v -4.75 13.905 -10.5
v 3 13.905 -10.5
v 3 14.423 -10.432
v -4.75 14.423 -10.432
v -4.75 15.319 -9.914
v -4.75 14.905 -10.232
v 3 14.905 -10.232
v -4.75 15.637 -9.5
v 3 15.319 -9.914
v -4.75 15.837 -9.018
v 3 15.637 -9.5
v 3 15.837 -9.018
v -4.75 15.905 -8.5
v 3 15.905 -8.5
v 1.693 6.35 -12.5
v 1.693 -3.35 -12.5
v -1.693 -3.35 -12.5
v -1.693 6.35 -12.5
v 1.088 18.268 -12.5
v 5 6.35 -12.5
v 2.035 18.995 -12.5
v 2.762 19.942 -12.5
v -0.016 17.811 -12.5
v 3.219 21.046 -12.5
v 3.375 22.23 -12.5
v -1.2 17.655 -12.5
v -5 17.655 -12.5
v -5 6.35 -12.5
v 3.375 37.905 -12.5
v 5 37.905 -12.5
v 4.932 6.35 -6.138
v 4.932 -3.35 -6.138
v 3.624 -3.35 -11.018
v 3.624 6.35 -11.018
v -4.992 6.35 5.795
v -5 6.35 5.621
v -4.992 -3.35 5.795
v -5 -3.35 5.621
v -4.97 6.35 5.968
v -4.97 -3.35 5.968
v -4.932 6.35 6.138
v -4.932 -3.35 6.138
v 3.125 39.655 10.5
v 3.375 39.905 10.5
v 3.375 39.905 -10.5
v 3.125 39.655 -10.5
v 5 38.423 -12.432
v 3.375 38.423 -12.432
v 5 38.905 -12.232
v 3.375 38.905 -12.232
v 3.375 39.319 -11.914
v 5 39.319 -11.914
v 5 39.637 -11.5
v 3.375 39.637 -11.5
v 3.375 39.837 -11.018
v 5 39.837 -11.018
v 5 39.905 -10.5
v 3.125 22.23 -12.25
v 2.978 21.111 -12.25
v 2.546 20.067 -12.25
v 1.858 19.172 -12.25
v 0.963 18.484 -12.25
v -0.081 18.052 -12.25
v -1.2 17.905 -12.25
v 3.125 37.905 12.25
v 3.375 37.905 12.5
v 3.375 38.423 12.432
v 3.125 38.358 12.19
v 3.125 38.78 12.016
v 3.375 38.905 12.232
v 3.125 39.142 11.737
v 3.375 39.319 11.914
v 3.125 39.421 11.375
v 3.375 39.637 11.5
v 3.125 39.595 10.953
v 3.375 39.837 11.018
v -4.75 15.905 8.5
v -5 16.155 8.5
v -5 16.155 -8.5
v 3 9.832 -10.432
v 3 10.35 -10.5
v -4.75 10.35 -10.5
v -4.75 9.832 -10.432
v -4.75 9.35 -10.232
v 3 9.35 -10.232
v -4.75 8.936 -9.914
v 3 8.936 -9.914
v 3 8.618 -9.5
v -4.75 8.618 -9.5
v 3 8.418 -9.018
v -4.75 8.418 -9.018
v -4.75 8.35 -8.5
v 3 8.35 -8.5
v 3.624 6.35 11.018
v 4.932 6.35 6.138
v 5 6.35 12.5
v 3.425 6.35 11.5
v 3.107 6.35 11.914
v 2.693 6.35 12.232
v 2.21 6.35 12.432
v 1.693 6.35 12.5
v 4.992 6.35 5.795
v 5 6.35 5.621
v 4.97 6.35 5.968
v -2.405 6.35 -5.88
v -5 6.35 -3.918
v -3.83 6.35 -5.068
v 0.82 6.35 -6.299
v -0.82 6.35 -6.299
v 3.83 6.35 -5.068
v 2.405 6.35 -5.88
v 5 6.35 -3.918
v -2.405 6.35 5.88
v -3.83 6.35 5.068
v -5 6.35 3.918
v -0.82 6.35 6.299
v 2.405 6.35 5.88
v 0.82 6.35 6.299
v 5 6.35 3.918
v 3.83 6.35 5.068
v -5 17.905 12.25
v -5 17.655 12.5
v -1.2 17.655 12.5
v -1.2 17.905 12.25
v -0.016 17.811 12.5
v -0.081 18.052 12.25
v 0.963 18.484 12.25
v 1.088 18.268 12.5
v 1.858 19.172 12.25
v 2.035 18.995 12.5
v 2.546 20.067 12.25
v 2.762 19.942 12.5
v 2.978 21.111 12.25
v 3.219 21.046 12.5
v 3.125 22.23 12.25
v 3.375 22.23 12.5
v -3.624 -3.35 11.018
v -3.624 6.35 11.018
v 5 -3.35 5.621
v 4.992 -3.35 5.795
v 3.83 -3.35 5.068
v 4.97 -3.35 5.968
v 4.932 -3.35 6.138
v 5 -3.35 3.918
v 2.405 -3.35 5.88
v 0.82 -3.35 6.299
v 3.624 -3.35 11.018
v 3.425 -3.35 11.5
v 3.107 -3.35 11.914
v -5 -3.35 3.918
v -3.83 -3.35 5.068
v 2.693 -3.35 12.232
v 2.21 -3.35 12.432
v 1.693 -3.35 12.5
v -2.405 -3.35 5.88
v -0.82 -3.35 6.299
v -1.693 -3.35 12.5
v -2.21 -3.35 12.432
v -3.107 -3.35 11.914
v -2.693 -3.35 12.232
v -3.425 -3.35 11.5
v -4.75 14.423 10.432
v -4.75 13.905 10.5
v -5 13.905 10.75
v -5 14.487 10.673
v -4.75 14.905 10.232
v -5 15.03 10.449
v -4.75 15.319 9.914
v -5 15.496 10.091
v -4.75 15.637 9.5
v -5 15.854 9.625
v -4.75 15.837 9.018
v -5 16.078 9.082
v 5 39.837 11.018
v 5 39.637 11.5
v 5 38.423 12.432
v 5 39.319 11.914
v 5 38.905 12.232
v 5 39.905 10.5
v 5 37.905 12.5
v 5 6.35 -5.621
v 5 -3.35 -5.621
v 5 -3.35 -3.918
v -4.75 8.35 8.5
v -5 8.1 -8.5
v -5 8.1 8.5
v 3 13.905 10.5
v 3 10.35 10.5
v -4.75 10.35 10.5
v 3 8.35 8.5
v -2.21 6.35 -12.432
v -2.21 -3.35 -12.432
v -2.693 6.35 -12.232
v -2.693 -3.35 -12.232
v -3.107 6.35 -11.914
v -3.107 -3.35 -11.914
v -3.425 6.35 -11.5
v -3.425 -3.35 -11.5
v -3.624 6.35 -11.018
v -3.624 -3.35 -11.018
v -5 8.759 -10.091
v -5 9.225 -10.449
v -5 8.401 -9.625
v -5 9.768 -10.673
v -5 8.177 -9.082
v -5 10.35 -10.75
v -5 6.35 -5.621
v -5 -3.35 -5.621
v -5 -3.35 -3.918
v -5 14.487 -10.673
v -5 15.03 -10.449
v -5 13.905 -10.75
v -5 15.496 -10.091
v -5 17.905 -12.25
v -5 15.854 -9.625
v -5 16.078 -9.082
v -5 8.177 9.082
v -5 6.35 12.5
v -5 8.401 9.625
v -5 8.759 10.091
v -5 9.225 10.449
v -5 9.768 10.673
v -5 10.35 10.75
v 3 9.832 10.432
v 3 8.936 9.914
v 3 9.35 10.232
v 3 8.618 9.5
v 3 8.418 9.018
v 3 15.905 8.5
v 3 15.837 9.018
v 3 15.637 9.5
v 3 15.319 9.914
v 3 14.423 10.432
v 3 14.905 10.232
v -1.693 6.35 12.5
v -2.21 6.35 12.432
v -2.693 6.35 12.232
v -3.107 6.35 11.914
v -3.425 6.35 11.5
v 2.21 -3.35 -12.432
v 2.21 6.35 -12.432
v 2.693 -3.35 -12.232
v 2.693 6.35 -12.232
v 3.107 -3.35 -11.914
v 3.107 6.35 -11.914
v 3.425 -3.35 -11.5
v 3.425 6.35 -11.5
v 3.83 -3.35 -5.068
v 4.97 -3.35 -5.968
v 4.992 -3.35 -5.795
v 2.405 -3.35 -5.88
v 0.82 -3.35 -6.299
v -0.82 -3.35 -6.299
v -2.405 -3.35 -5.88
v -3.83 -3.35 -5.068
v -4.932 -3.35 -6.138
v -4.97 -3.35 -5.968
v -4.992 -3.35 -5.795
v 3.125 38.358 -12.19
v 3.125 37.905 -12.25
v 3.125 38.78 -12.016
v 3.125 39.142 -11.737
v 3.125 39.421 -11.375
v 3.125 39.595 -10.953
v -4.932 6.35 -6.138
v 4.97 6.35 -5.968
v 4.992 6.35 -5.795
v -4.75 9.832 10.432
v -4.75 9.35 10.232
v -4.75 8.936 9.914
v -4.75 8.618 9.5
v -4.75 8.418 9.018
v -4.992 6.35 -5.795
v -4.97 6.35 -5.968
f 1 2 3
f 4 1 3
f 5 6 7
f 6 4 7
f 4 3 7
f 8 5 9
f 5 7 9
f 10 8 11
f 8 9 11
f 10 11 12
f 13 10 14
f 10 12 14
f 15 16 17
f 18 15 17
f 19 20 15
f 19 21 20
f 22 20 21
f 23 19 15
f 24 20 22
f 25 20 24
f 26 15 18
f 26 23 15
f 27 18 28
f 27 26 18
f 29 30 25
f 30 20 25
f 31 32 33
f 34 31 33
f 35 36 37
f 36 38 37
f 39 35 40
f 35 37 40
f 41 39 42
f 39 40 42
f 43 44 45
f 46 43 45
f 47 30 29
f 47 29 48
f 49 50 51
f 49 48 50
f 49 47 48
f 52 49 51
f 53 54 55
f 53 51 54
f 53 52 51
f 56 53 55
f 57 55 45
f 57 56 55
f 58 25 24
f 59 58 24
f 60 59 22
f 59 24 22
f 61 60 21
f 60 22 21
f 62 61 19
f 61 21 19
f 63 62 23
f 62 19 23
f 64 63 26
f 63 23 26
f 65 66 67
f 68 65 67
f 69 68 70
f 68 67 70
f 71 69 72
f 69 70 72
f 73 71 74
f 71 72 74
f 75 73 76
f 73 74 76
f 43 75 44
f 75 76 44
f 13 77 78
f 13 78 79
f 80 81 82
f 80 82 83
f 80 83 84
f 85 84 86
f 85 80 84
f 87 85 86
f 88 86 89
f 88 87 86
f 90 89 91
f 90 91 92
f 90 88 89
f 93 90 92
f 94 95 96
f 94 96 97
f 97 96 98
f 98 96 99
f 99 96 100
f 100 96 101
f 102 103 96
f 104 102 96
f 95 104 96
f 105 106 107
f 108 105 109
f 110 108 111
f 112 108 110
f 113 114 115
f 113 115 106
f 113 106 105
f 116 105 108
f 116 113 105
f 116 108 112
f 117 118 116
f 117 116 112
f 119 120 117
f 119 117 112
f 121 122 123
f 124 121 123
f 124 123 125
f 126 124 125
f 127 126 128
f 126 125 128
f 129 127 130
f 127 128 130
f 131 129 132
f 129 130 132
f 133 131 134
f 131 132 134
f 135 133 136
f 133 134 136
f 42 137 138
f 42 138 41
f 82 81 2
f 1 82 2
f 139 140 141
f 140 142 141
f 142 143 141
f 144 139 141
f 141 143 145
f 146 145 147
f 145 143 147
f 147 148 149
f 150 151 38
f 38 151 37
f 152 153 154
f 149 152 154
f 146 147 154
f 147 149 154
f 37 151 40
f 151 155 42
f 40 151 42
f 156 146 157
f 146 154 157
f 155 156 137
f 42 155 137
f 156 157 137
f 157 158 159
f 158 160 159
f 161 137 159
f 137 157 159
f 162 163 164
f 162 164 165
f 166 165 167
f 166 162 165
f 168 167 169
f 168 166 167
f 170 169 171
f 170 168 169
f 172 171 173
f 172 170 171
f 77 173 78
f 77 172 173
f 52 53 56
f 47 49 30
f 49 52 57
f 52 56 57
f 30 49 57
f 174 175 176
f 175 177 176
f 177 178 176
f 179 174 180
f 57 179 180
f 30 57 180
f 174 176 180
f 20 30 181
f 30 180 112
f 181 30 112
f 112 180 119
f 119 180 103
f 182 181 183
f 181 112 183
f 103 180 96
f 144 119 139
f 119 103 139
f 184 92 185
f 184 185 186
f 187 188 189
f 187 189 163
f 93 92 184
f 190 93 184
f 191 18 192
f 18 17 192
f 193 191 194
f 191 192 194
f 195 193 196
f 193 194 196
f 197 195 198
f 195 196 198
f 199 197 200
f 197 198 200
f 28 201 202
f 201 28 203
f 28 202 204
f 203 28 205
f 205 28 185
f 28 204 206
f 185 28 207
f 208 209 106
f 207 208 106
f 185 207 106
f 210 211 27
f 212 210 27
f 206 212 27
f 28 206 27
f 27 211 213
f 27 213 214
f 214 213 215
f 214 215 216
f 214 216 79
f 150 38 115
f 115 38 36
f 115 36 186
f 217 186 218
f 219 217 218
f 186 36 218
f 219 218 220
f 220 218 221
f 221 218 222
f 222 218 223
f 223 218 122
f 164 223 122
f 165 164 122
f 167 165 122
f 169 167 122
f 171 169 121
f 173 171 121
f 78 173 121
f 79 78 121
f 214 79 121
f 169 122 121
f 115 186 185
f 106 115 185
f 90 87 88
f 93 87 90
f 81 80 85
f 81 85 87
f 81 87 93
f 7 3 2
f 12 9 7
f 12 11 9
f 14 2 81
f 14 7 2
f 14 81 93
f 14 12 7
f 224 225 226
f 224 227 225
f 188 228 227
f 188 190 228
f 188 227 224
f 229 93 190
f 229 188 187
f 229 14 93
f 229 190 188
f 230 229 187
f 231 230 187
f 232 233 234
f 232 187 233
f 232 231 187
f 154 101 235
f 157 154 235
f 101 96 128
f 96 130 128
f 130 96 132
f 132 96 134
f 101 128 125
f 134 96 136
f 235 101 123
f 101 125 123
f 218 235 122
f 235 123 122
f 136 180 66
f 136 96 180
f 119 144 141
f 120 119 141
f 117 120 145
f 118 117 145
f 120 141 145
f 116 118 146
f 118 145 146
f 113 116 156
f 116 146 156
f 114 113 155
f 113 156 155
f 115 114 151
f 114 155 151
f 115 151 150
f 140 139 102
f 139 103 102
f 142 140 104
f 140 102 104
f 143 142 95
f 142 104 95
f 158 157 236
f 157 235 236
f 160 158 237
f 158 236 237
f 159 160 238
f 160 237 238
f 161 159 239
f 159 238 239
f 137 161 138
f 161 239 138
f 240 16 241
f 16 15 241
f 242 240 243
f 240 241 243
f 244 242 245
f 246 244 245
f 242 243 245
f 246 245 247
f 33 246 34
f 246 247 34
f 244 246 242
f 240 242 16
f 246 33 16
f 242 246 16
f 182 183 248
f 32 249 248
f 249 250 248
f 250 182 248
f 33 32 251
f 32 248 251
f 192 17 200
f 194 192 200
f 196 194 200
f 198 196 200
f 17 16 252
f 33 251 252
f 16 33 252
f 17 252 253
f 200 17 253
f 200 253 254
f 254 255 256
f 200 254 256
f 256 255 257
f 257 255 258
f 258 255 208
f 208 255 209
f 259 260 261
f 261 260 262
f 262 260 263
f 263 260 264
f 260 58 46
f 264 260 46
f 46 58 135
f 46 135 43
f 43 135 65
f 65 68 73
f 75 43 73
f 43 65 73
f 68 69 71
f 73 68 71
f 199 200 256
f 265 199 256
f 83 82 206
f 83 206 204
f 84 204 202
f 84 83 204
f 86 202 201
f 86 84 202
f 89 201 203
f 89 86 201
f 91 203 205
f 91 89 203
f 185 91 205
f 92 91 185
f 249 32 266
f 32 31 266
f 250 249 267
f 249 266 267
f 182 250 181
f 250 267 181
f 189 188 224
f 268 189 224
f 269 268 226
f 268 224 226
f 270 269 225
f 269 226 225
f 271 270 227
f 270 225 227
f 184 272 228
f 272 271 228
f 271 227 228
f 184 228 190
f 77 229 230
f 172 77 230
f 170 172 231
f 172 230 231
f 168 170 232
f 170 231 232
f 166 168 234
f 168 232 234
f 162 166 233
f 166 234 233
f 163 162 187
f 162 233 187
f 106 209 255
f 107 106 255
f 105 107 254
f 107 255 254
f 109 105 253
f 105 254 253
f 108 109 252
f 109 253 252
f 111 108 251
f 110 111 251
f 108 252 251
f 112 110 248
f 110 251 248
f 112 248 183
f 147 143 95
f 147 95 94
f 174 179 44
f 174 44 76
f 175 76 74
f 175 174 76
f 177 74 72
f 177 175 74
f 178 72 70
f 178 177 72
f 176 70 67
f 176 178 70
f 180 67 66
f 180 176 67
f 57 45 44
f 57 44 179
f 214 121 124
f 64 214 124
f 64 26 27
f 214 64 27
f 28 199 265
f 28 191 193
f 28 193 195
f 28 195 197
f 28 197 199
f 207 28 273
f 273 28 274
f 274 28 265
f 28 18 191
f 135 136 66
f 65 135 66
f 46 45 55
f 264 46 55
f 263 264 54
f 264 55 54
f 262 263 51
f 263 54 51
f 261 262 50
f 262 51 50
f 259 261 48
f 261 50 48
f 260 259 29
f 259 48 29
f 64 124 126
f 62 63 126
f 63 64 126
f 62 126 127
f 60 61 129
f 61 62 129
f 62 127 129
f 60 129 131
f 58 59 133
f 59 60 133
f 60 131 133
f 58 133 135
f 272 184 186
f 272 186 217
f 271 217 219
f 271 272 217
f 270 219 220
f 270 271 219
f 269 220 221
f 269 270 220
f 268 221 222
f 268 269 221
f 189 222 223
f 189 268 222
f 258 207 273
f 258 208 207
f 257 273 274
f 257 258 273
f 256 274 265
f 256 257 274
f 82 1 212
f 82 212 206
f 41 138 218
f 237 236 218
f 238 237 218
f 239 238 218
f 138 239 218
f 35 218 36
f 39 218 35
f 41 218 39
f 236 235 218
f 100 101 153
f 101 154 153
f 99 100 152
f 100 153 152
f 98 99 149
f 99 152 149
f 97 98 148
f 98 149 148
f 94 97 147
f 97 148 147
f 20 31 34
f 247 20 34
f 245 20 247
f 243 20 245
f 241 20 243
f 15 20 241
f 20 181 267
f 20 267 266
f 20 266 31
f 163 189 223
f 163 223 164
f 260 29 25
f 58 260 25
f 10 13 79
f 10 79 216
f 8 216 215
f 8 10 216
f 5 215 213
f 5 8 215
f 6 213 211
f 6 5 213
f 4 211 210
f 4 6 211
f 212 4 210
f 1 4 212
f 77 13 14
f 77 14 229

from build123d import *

# Parameters (mm, degrees)
BOSS_EXTRUDE1_DEPTH = 12.5
SKETCH3_R           = 6.3525
CUT_EXTRUDE1_DEPTH  = 9.7
FILLET1_R           = 2
CUT_EXTRUDE2_DEPTH  = 9.7
FILLET2_R           = 2
SKETCH7_W           = 21
SKETCH7_H           = 7.555
CUT_EXTRUDE3_DEPTH  = 8
FILLET3_R           = 2
CHAMFER1_SIZE       = 0.25


with BuildPart() as part:
    # Sketch2 → Boss-Extrude1 (new body, symmetric)
    with BuildSketch(Plane.XY):
        with BuildLine():
            Line((3.125, 22.23), (3.125, 39.905))
            Line((3.125, 39.905), (5, 39.905))
            Line((5, 39.905), (5, -3.35))
            Line((5, -3.35), (-5, -3.35))
            Line((-5, -3.35), (-5, 17.905))
            Line((-5, 17.905), (-1.2, 17.905))
            ThreePointArc((-1.2, 17.905), (1.858236829, 19.171763171), (3.125, 22.23))
        make_face()
    extrude(amount=BOSS_EXTRUDE1_DEPTH, both=True)

    # Sketch3 → Cut-Extrude1 (cut)
    with BuildSketch(Plane.XZ.offset(3.35)):
        Circle(SKETCH3_R)
    extrude(amount=-CUT_EXTRUDE1_DEPTH, mode=Mode.SUBTRACT)

    # Fillet1
    fillet1_edges = [part.edges().sort_by_distance(p)[0] for p in [
        (4.0625, 39.905, 12.5),
        (4.0625, 39.905, -12.5),
    ]]
    fillet(fillet1_edges, radius=FILLET1_R)

    # Sketch6 → Cut-Extrude2 (cut)
    with BuildSketch(Plane.XZ.offset(3.35)):
        Polygon((0, 24.544175246), (-5.421515272, 4.310804798), (-5.421515272, 3.310804798), (-5.421515272, 0), (-10.421515272, 0), (-10.421515272, 29.544175246), (10.421515272, 29.544175246), (10.421515272, 0), (5.421515272, 0), (5.421515272, 3.310804798), (5.421515272, 4.310804798), align=None)
    cut_extrude2 = extrude(amount=-CUT_EXTRUDE2_DEPTH, mode=Mode.SUBTRACT)

    # Mirror1: Cut-Extrude2 across plane
    add(cut_extrude2.mirror(Plane.XY), mode=Mode.SUBTRACT)

    # Fillet2
    fillet2_edges = [part.edges().sort_by_distance(p)[0] for p in [
        (-3.227227031, 1.5, 12.5),
        (3.227227031, 1.5, 12.5),
        (5, 1.5, 5.883921208),
        (-5, 1.5, 5.883921208),
        (-3.227227031, 1.5, -12.5),
        (3.227227031, 1.5, -12.5),
        (-5, 1.5, -5.883921208),
        (5, 1.5, -5.883921208),
    ]]
    fillet(fillet2_edges, radius=FILLET2_R)

    # Sketch7 → Cut-Extrude3 (cut)
    with BuildSketch(Plane.ZY.offset(5)):
        with Locations((0, 12.1275)):
            Rectangle(SKETCH7_W, SKETCH7_H)
    extrude(amount=-CUT_EXTRUDE3_DEPTH, mode=Mode.SUBTRACT)

    # Fillet3
    fillet3_edges = [part.edges().sort_by_distance(p)[0] for p in [
        (-1, 8.35, -10.5),
        (-1, 15.905, -10.5),
        (-1, 15.905, 10.5),
        (-1, 8.35, 10.5),
    ]]
    fillet(fillet3_edges, radius=FILLET3_R)

    # Chamfer1
    chamfer1_edges = [part.edges().sort_by_distance(p)[0] for p in [
        (-5, 12.1275, 10.5),
        (-5, 8.35, 0),
        (-5, 12.1275, -10.5),
        (-5, 15.905, 0),
        (-5, 8.935786438, 9.914213562),
        (-5, 8.935786438, -9.914213562),
        (-5, 15.319213562, 9.914213562),
        (-5, 15.319213562, -9.914213562),
        (3.125, 39.905, 0),
        (3.125, 30.0675, -12.5),
        (3.125, 30.0675, 12.5),
        (3.125, 39.319213562, 11.914213562),
        (1.858236829, 19.171763171, 12.5),
        (3.125, 39.319213562, -11.914213562),
        (-3.1, 17.905, 12.5),
        (-3.1, 17.905, -12.5),
        (1.858236829, 19.171763171, -12.5),
    ]]
    chamfer(chamfer1_edges, length=CHAMFER1_SIZE)


solid = part.part
